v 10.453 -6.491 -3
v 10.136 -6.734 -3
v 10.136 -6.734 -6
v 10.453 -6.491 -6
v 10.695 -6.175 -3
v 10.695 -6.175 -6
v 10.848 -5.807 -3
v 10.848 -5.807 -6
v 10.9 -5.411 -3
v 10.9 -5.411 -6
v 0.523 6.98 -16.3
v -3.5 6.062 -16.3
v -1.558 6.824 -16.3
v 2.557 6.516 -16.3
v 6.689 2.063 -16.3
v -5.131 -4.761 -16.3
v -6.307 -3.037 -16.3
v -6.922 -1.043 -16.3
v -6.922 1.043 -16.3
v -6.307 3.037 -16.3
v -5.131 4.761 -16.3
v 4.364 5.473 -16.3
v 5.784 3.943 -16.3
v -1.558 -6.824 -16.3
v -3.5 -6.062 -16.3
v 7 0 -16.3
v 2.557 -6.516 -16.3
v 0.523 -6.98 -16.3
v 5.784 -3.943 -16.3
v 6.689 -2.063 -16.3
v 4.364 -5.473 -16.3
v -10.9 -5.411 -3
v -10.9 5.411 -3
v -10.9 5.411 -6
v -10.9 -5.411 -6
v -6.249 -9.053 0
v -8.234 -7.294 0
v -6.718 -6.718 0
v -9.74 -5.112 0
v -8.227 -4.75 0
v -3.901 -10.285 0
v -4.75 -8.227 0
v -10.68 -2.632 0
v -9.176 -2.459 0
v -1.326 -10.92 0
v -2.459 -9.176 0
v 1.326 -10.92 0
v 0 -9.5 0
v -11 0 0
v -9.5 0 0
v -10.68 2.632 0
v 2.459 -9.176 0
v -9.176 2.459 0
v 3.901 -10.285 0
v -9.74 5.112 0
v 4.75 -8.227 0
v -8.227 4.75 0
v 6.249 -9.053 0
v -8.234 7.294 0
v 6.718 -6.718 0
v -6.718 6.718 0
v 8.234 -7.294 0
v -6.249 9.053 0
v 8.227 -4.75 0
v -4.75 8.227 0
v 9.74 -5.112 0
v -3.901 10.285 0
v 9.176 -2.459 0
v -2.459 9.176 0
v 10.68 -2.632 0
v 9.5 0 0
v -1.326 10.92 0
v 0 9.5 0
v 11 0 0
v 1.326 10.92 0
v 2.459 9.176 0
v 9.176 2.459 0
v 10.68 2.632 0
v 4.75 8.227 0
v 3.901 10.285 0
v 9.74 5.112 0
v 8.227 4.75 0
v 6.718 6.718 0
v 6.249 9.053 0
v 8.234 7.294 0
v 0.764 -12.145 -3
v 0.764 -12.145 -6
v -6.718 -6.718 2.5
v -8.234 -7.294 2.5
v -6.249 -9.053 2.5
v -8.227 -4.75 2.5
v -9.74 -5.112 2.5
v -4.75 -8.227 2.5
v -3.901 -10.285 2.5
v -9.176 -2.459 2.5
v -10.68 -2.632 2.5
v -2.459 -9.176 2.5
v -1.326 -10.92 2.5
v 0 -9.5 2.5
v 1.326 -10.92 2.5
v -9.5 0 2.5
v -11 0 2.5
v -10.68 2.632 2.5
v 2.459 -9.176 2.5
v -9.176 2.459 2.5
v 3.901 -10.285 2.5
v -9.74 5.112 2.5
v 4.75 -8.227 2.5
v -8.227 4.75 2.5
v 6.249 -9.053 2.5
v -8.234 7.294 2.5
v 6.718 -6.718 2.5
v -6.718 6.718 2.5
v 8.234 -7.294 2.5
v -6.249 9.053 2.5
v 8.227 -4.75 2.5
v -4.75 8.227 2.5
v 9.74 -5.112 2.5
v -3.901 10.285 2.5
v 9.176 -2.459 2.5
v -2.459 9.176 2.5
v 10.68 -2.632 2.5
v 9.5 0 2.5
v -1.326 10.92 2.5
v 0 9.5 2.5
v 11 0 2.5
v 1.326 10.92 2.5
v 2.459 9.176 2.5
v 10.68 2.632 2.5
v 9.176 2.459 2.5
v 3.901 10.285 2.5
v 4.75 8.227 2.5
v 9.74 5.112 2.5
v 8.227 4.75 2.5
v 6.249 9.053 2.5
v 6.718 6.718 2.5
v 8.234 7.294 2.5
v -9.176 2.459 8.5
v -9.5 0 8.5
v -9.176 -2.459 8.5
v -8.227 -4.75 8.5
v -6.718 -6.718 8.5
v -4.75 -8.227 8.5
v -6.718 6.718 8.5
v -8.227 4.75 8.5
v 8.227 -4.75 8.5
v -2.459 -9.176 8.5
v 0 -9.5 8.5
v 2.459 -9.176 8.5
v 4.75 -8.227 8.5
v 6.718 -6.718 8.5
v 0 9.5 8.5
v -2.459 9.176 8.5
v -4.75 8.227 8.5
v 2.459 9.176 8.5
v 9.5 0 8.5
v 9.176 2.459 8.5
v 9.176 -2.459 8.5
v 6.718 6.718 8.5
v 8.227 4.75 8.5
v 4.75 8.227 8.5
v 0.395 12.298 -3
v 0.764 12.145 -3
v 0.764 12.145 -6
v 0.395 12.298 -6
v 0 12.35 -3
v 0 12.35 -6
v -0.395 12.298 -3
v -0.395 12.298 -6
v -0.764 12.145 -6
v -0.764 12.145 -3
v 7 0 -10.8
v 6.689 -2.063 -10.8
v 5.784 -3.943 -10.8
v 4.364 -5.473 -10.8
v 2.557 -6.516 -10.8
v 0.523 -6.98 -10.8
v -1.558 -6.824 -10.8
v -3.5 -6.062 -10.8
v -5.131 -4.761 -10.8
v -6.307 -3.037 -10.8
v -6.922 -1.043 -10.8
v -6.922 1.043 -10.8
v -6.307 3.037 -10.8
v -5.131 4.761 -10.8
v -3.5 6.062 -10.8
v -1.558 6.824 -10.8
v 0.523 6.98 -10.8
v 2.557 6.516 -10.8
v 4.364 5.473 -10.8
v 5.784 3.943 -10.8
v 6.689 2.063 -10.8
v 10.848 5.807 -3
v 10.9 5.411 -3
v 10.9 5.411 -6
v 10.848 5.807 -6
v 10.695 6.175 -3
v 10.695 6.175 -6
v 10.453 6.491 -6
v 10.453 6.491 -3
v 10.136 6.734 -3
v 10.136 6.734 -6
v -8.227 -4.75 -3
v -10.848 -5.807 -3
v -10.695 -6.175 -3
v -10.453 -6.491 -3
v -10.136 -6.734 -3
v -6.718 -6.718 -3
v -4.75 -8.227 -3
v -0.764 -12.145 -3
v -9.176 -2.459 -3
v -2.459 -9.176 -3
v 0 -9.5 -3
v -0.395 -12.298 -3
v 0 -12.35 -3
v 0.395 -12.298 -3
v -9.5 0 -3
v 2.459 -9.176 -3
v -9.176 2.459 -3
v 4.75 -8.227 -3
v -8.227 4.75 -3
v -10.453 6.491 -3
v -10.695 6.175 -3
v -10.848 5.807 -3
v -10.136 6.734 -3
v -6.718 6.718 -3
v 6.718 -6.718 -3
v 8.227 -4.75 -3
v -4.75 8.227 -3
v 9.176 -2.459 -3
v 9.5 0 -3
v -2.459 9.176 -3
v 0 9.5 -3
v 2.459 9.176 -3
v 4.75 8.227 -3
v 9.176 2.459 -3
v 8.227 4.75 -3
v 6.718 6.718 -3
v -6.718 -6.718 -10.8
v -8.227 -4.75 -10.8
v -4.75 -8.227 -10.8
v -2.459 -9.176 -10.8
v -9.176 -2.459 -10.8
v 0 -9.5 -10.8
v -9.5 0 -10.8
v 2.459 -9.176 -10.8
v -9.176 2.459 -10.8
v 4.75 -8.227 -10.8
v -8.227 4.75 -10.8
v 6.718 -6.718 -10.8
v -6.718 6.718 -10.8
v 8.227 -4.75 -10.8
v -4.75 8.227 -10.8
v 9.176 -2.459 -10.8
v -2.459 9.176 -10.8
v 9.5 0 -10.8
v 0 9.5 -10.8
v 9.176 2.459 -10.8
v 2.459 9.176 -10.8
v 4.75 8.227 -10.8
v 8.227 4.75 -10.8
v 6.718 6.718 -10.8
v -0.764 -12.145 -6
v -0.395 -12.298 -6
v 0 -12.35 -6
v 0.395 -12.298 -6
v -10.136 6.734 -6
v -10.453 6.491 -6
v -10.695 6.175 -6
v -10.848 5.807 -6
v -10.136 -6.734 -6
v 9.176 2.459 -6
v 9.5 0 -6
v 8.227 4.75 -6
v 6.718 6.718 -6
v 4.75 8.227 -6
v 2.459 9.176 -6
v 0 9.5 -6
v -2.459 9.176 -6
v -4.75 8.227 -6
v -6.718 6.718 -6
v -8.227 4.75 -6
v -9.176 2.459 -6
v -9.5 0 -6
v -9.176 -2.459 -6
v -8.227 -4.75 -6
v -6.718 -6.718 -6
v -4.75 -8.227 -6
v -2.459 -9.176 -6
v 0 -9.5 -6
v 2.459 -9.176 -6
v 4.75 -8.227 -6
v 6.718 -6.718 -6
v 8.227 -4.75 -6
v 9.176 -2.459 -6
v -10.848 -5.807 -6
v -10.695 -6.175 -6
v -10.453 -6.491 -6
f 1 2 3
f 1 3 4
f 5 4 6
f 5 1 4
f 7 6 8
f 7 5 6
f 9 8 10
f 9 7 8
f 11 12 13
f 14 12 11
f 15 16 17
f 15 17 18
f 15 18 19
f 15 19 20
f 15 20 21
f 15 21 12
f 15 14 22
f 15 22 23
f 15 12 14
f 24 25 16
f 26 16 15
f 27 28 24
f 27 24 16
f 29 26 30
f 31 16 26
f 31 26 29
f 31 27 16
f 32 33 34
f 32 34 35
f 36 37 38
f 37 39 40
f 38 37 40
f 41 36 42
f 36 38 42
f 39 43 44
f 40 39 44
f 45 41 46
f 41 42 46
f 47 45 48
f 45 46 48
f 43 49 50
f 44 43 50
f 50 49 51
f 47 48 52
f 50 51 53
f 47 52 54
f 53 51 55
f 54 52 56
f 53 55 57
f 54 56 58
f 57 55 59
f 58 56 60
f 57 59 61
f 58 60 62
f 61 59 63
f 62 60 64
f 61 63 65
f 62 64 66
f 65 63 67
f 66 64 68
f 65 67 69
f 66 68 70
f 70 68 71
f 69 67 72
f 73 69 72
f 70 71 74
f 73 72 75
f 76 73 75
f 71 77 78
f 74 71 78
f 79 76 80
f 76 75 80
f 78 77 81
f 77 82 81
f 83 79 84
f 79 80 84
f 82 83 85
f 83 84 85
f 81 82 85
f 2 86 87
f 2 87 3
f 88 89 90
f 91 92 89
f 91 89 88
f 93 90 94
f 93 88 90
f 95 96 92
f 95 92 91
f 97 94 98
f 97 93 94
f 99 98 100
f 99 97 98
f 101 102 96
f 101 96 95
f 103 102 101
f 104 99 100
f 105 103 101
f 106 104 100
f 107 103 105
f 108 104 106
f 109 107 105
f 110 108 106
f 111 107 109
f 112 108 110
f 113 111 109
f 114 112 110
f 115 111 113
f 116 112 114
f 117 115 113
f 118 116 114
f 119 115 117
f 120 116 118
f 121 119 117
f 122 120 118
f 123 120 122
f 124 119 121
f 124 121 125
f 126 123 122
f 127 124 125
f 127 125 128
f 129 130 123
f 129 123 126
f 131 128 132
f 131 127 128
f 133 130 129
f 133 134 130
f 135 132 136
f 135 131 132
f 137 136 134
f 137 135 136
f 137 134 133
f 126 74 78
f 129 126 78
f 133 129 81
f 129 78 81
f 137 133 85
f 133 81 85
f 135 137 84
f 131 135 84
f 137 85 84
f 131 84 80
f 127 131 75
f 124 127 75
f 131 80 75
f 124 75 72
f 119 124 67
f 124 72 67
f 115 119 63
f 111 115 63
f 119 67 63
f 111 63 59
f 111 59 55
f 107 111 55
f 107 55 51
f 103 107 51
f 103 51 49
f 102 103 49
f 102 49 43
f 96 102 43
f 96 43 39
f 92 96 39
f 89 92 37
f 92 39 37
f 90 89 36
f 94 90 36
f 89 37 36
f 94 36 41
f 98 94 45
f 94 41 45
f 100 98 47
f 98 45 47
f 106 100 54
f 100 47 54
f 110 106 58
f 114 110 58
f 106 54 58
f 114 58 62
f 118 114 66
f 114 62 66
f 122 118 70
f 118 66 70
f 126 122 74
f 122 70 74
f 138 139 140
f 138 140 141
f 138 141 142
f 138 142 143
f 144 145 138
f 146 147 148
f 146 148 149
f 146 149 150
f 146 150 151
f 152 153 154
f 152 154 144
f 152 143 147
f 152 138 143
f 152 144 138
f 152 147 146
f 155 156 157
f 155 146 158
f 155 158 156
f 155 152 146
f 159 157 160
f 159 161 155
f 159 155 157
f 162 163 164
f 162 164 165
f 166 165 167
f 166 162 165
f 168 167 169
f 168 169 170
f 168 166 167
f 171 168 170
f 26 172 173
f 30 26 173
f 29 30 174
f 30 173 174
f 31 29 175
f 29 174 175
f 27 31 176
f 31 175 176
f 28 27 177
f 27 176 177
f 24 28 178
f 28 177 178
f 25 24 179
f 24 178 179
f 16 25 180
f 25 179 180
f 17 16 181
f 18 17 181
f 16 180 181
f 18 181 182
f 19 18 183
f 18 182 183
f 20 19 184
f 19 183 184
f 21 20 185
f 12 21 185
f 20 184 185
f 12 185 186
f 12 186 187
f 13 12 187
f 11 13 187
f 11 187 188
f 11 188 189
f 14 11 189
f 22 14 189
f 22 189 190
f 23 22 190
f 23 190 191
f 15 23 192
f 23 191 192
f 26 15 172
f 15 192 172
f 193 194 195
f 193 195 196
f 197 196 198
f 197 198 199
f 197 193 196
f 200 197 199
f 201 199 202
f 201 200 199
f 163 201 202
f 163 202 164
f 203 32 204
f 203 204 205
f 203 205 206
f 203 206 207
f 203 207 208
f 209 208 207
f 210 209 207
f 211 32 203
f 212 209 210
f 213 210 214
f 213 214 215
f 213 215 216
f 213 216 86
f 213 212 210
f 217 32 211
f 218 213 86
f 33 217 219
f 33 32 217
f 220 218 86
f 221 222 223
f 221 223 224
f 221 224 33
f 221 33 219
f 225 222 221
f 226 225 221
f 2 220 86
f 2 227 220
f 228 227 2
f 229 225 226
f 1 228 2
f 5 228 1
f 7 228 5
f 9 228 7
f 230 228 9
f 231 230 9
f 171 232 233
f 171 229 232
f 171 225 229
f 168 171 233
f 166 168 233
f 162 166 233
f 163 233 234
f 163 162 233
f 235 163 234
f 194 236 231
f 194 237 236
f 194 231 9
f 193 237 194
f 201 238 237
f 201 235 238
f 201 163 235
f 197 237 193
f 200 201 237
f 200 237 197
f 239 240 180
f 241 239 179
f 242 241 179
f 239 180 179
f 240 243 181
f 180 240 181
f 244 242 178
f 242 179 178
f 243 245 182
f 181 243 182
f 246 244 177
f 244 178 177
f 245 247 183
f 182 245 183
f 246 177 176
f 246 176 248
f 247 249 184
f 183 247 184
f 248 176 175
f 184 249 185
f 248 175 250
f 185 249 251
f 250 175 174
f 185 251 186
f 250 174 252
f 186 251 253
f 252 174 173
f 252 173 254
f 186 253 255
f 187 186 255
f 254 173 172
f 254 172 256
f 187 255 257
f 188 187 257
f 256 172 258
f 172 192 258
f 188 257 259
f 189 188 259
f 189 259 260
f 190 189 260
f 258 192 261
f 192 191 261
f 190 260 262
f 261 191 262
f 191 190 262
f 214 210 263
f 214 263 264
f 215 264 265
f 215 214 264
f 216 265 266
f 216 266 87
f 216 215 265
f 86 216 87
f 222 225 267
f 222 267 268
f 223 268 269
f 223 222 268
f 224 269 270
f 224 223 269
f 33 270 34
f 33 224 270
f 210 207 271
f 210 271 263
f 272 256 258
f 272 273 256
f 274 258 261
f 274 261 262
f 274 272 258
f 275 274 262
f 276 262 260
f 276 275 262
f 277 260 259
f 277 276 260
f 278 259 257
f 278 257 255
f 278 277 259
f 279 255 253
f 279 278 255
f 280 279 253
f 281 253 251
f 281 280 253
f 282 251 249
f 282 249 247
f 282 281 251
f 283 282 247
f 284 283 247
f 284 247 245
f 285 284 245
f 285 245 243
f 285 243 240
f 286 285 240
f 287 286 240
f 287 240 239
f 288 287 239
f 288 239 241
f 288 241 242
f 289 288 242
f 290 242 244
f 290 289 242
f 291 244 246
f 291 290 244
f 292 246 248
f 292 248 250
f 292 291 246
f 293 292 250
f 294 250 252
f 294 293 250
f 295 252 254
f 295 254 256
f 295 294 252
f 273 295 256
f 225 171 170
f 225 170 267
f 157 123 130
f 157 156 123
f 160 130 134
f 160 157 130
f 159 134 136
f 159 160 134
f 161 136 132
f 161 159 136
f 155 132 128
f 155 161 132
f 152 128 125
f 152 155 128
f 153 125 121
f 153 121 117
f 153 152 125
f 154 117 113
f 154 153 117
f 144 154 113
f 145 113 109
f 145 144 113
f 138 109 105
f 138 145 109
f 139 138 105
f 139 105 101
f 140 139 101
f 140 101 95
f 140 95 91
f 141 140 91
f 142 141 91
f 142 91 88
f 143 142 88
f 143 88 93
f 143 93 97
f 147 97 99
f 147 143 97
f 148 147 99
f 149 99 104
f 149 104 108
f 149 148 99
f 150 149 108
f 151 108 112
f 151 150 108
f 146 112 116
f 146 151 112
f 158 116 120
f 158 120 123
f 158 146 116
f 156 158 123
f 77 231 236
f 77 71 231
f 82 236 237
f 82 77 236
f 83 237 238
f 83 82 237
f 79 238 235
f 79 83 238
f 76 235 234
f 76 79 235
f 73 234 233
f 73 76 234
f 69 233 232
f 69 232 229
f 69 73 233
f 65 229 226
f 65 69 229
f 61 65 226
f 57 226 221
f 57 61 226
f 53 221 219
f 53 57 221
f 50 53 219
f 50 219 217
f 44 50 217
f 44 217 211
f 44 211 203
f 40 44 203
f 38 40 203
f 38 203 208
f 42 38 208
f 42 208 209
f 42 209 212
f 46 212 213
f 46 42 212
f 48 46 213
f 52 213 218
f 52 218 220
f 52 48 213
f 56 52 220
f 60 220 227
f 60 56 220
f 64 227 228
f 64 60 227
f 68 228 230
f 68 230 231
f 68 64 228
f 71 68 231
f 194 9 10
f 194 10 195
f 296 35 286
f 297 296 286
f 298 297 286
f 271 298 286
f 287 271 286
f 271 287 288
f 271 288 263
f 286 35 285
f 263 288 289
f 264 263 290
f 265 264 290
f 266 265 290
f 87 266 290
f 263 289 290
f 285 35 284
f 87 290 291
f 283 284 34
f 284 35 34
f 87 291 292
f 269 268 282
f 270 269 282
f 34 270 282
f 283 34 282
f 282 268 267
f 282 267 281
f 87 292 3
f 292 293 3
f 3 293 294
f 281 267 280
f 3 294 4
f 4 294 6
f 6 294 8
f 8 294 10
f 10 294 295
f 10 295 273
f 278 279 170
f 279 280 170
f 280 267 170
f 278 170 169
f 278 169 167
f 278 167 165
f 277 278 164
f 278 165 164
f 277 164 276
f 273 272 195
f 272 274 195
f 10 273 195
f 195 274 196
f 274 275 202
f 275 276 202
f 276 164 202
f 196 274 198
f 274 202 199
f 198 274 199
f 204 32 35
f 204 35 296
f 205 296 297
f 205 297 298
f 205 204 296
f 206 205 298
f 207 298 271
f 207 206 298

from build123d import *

# Parameters (mm, degrees)
F0_R          = 9.5
F1_DEPTH      = 8.5
F1_DEPTH_BACK = 10.8
F2_R          = 11
F3_DEPTH      = 2.5
F6_DEPTH      = 3
F7_R          = 7
F8_DEPTH      = 5.5


with BuildPart() as f1:
    # F0 (on Top) → F1 (new body, two sides)
    with BuildSketch(Plane.XY) as f1_sk:
        Circle(F0_R)
    extrude(amount=F1_DEPTH)
    extrude(f1_sk.sketch, amount=-F1_DEPTH_BACK)

    # F2 (on Top) → F3 (join)
    with BuildSketch(Plane.XY):
        Circle(F2_R)
    extrude(amount=F3_DEPTH)

    # F5 (on offset) → F6 (join)
    with BuildSketch(Plane.XY.offset(-3)):
        with BuildLine():
            Line((10.136474, 6.73394), (0.763526, 12.145414))
            ThreePointArc((0.763526, 12.145414), (0, 12.35), (-0.763526, 12.145414))
            Line((-0.763526, 12.145414), (-10.136474, 6.73394))
            ThreePointArc((-10.136474, 6.73394), (-10.695414, 6.175), (-10.9, 5.411474))
            Line((-10.9, 5.411474), (-10.9, -5.411474))
            ThreePointArc((-10.9, -5.411474), (-10.695414, -6.175), (-10.136474, -6.73394))
            Line((-10.136474, -6.73394), (-0.763526, -12.145414))
            ThreePointArc((-0.763526, -12.145414), (0, -12.35), (0.763526, -12.145414))
            Line((0.763526, -12.145414), (10.136474, -6.73394))
            ThreePointArc((10.136474, -6.73394), (10.695414, -6.175), (10.9, -5.411474))
            Line((10.9, -5.411474), (10.9, 5.411474))
            ThreePointArc((10.9, 5.411474), (10.695414, 6.175), (10.136474, 6.73394))
        make_face()
    extrude(amount=-F6_DEPTH)

    # F7 (on face) → F8 (join)
    with BuildSketch(Plane(origin=(0, 0, -10.8), x_dir=(1, 0, 0), z_dir=(0, 0, -1))):
        Circle(F7_R)
    extrude(amount=F8_DEPTH)


solid = f1.part
